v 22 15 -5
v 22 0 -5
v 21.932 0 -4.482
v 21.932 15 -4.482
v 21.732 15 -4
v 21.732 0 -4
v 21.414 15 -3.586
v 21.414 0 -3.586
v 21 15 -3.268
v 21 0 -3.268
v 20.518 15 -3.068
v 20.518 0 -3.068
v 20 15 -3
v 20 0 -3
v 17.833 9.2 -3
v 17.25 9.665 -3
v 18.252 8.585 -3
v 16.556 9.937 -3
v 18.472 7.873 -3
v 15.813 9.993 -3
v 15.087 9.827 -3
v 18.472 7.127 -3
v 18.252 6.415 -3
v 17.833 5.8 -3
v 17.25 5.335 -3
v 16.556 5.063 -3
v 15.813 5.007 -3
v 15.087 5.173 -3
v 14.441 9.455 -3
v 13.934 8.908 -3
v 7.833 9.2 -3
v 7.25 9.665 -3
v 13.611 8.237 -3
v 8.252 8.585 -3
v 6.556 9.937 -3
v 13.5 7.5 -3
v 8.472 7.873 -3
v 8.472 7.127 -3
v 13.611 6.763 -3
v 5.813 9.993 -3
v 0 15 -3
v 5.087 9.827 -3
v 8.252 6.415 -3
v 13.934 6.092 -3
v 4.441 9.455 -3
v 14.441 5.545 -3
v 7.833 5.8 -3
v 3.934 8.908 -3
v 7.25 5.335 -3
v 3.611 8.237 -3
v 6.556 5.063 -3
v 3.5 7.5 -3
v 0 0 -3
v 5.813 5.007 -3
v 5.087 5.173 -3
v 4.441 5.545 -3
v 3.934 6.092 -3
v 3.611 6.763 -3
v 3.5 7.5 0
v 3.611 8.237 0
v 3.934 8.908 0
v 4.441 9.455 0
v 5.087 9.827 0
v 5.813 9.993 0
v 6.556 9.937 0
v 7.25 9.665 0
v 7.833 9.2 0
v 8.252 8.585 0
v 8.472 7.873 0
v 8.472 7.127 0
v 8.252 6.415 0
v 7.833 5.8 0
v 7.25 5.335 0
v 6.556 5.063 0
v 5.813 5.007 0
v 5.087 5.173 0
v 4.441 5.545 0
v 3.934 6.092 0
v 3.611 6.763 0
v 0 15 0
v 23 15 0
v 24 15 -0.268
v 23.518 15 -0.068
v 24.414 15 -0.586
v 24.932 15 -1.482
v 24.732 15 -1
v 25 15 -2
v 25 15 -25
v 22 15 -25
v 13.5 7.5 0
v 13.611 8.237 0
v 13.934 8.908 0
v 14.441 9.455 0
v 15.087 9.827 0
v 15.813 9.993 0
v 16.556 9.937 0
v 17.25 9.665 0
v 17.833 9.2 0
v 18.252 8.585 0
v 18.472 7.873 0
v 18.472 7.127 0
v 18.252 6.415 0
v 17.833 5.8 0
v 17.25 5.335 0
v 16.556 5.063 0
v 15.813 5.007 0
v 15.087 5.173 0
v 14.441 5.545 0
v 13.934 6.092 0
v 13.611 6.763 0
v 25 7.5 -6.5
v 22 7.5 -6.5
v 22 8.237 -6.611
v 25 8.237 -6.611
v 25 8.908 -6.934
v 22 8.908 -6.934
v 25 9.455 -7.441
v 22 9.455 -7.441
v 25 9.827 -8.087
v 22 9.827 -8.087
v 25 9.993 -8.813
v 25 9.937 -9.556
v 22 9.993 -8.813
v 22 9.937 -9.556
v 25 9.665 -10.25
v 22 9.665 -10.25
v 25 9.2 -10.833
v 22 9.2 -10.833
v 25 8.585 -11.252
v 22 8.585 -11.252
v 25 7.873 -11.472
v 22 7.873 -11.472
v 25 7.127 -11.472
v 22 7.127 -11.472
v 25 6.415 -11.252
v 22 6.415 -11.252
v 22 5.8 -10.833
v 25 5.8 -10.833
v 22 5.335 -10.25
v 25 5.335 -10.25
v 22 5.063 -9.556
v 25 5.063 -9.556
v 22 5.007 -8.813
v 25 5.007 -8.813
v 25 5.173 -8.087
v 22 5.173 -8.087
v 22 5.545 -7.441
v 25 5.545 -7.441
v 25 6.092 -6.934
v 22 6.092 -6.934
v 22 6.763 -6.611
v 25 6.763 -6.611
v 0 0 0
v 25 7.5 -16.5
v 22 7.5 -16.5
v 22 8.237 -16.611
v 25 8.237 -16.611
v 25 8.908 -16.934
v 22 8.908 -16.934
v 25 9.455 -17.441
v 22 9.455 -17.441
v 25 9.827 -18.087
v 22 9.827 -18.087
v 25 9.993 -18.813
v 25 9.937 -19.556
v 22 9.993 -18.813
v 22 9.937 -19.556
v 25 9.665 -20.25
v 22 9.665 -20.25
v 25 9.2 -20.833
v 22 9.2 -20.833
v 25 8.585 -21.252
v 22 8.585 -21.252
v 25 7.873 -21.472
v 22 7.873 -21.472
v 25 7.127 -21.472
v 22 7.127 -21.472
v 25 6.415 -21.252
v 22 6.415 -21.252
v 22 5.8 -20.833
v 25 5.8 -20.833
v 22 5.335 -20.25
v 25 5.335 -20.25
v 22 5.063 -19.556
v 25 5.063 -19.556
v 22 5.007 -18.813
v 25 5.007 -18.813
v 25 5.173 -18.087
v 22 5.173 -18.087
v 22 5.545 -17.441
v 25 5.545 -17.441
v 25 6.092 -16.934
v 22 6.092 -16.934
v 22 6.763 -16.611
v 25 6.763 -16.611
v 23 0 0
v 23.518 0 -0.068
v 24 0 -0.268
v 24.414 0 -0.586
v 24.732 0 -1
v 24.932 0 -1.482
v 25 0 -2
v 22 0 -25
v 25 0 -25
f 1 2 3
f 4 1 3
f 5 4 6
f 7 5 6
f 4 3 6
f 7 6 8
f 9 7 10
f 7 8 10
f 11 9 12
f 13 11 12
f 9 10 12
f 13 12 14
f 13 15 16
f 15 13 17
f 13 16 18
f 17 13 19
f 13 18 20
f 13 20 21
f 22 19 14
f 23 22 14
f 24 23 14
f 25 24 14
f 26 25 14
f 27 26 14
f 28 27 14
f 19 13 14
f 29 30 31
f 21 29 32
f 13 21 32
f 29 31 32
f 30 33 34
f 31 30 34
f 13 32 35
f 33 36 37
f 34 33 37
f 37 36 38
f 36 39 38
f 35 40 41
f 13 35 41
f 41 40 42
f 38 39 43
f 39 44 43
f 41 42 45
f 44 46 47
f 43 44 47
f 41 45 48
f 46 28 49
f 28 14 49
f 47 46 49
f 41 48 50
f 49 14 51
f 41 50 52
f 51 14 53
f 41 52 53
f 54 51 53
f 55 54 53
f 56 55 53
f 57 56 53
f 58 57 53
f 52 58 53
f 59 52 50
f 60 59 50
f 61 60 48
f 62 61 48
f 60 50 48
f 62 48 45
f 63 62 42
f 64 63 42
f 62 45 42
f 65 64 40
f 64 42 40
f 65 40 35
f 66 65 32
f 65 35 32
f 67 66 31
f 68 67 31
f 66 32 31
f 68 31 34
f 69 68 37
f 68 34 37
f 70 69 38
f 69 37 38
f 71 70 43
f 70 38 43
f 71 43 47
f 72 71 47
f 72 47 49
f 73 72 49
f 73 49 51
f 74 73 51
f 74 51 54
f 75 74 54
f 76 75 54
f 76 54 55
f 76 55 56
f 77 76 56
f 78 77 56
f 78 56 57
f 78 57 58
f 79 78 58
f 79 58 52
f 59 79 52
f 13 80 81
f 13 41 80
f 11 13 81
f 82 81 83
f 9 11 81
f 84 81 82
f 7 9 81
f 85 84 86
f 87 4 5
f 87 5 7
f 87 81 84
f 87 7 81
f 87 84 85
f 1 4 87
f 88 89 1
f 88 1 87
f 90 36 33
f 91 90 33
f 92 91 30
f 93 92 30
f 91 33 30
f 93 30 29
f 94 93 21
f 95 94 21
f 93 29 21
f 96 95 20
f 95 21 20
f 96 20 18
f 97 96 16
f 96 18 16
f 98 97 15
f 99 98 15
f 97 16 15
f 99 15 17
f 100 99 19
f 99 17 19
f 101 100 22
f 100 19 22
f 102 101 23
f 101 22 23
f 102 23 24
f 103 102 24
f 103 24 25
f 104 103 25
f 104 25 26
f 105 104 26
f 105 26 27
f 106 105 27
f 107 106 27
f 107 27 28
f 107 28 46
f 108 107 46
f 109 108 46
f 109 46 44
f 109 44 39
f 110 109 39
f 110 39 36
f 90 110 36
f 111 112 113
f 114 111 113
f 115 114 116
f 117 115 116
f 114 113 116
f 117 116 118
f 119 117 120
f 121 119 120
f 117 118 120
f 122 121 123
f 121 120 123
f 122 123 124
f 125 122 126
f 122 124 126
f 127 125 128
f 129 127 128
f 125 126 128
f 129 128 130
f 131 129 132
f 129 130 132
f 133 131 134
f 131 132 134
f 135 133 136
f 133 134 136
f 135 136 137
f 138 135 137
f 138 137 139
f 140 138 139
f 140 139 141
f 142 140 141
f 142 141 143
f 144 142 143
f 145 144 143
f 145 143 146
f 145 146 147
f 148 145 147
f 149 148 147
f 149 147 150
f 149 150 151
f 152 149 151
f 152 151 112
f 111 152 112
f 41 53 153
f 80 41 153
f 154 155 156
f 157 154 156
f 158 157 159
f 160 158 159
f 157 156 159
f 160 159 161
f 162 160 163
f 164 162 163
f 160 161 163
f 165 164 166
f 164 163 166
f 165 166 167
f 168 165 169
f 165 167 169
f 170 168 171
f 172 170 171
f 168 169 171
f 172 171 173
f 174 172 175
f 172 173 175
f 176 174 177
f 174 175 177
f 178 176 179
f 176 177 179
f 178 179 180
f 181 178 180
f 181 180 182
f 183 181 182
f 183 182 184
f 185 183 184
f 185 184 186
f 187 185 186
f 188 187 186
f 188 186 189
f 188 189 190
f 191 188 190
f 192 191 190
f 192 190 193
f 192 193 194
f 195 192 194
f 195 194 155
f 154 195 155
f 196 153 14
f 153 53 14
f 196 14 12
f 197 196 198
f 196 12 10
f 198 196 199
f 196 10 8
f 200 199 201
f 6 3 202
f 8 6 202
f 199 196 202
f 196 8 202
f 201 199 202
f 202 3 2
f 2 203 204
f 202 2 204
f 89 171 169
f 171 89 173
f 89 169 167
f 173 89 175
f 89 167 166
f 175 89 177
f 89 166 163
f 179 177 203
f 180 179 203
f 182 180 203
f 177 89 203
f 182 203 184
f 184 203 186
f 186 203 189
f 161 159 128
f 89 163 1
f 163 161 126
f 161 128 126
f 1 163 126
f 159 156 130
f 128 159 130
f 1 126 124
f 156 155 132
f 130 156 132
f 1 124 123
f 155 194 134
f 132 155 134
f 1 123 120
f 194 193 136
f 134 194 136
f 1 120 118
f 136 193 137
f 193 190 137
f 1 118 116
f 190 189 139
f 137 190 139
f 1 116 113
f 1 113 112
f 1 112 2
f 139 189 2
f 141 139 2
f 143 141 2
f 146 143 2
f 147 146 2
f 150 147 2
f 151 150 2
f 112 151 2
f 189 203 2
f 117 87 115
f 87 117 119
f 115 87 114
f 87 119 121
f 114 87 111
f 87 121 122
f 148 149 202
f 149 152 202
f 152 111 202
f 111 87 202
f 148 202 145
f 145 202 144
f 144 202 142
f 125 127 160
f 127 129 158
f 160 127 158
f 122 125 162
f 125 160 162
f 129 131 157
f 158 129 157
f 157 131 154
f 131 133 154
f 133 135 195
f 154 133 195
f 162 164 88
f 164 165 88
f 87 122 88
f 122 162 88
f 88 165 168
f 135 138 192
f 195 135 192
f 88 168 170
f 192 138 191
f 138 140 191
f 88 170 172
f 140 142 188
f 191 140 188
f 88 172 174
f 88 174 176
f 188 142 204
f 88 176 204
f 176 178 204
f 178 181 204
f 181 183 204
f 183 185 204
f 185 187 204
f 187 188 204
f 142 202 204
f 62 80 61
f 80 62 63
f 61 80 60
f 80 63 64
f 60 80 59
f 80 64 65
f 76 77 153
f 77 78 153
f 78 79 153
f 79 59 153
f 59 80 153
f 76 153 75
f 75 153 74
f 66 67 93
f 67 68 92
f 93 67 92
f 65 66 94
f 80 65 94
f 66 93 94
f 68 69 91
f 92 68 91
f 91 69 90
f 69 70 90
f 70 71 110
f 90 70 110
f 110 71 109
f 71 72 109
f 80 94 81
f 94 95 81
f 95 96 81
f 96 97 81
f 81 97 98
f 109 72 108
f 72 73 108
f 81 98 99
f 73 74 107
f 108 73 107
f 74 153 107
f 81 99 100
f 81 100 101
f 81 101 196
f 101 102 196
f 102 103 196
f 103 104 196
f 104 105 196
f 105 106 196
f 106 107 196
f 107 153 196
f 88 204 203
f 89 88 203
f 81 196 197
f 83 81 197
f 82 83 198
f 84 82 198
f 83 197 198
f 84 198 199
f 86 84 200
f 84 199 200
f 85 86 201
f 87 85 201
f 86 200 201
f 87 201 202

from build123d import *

# Parameters (mm, degrees)
SALIENTE_EXTRUIR1_DEPTH = 15
CROQUIS2_R              = 2.5
CORTAR_EXTRUIR1_DEPTH   = 20
CROQUIS3_R              = 2.5
CORTAR_EXTRUIR2_DEPTH   = 15


with BuildPart() as part:
    # Croquis1 → Saliente-Extruir1 (new body)
    with BuildSketch(Plane(origin=(0, 0, 0), x_dir=(1, 0, 0), z_dir=(0, 1, 0))):
        with BuildLine():
            Line((0, 0), (23, 0))
            ThreePointArc((23, 0), (24.414213562, 0.585786438), (25, 2))
            Line((25, 2), (25, 25))
            Line((25, 25), (22, 25))
            Line((22, 25), (22, 5))
            ThreePointArc((22, 5), (21.414213562, 3.585786438), (20, 3))
            Line((20, 3), (0, 3))
            Line((0, 3), (0, 0))
        make_face()
    extrude(amount=SALIENTE_EXTRUIR1_DEPTH)

    # Croquis2 → Cortar-Extruir1 (cut)
    with BuildSketch(Plane(origin=(0, 0, -3), x_dir=(-1, 0, 0), z_dir=(0, 0, -1))):
        with Locations((-16, 7.5)):
            Circle(CROQUIS2_R)
        with Locations((-6, 7.5)):
            Circle(CROQUIS2_R)
    extrude(amount=-CORTAR_EXTRUIR1_DEPTH, mode=Mode.SUBTRACT)

    # Croquis3 → Cortar-Extruir2 (cut)
    with BuildSketch(Plane.ZY.offset(-22)):
        with Locations((-9, 7.5)):
            Circle(CROQUIS3_R)
        with Locations((-19, 7.5)):
            Circle(CROQUIS3_R)
    extrude(amount=-CORTAR_EXTRUIR2_DEPTH, mode=Mode.SUBTRACT)


solid = part.part
